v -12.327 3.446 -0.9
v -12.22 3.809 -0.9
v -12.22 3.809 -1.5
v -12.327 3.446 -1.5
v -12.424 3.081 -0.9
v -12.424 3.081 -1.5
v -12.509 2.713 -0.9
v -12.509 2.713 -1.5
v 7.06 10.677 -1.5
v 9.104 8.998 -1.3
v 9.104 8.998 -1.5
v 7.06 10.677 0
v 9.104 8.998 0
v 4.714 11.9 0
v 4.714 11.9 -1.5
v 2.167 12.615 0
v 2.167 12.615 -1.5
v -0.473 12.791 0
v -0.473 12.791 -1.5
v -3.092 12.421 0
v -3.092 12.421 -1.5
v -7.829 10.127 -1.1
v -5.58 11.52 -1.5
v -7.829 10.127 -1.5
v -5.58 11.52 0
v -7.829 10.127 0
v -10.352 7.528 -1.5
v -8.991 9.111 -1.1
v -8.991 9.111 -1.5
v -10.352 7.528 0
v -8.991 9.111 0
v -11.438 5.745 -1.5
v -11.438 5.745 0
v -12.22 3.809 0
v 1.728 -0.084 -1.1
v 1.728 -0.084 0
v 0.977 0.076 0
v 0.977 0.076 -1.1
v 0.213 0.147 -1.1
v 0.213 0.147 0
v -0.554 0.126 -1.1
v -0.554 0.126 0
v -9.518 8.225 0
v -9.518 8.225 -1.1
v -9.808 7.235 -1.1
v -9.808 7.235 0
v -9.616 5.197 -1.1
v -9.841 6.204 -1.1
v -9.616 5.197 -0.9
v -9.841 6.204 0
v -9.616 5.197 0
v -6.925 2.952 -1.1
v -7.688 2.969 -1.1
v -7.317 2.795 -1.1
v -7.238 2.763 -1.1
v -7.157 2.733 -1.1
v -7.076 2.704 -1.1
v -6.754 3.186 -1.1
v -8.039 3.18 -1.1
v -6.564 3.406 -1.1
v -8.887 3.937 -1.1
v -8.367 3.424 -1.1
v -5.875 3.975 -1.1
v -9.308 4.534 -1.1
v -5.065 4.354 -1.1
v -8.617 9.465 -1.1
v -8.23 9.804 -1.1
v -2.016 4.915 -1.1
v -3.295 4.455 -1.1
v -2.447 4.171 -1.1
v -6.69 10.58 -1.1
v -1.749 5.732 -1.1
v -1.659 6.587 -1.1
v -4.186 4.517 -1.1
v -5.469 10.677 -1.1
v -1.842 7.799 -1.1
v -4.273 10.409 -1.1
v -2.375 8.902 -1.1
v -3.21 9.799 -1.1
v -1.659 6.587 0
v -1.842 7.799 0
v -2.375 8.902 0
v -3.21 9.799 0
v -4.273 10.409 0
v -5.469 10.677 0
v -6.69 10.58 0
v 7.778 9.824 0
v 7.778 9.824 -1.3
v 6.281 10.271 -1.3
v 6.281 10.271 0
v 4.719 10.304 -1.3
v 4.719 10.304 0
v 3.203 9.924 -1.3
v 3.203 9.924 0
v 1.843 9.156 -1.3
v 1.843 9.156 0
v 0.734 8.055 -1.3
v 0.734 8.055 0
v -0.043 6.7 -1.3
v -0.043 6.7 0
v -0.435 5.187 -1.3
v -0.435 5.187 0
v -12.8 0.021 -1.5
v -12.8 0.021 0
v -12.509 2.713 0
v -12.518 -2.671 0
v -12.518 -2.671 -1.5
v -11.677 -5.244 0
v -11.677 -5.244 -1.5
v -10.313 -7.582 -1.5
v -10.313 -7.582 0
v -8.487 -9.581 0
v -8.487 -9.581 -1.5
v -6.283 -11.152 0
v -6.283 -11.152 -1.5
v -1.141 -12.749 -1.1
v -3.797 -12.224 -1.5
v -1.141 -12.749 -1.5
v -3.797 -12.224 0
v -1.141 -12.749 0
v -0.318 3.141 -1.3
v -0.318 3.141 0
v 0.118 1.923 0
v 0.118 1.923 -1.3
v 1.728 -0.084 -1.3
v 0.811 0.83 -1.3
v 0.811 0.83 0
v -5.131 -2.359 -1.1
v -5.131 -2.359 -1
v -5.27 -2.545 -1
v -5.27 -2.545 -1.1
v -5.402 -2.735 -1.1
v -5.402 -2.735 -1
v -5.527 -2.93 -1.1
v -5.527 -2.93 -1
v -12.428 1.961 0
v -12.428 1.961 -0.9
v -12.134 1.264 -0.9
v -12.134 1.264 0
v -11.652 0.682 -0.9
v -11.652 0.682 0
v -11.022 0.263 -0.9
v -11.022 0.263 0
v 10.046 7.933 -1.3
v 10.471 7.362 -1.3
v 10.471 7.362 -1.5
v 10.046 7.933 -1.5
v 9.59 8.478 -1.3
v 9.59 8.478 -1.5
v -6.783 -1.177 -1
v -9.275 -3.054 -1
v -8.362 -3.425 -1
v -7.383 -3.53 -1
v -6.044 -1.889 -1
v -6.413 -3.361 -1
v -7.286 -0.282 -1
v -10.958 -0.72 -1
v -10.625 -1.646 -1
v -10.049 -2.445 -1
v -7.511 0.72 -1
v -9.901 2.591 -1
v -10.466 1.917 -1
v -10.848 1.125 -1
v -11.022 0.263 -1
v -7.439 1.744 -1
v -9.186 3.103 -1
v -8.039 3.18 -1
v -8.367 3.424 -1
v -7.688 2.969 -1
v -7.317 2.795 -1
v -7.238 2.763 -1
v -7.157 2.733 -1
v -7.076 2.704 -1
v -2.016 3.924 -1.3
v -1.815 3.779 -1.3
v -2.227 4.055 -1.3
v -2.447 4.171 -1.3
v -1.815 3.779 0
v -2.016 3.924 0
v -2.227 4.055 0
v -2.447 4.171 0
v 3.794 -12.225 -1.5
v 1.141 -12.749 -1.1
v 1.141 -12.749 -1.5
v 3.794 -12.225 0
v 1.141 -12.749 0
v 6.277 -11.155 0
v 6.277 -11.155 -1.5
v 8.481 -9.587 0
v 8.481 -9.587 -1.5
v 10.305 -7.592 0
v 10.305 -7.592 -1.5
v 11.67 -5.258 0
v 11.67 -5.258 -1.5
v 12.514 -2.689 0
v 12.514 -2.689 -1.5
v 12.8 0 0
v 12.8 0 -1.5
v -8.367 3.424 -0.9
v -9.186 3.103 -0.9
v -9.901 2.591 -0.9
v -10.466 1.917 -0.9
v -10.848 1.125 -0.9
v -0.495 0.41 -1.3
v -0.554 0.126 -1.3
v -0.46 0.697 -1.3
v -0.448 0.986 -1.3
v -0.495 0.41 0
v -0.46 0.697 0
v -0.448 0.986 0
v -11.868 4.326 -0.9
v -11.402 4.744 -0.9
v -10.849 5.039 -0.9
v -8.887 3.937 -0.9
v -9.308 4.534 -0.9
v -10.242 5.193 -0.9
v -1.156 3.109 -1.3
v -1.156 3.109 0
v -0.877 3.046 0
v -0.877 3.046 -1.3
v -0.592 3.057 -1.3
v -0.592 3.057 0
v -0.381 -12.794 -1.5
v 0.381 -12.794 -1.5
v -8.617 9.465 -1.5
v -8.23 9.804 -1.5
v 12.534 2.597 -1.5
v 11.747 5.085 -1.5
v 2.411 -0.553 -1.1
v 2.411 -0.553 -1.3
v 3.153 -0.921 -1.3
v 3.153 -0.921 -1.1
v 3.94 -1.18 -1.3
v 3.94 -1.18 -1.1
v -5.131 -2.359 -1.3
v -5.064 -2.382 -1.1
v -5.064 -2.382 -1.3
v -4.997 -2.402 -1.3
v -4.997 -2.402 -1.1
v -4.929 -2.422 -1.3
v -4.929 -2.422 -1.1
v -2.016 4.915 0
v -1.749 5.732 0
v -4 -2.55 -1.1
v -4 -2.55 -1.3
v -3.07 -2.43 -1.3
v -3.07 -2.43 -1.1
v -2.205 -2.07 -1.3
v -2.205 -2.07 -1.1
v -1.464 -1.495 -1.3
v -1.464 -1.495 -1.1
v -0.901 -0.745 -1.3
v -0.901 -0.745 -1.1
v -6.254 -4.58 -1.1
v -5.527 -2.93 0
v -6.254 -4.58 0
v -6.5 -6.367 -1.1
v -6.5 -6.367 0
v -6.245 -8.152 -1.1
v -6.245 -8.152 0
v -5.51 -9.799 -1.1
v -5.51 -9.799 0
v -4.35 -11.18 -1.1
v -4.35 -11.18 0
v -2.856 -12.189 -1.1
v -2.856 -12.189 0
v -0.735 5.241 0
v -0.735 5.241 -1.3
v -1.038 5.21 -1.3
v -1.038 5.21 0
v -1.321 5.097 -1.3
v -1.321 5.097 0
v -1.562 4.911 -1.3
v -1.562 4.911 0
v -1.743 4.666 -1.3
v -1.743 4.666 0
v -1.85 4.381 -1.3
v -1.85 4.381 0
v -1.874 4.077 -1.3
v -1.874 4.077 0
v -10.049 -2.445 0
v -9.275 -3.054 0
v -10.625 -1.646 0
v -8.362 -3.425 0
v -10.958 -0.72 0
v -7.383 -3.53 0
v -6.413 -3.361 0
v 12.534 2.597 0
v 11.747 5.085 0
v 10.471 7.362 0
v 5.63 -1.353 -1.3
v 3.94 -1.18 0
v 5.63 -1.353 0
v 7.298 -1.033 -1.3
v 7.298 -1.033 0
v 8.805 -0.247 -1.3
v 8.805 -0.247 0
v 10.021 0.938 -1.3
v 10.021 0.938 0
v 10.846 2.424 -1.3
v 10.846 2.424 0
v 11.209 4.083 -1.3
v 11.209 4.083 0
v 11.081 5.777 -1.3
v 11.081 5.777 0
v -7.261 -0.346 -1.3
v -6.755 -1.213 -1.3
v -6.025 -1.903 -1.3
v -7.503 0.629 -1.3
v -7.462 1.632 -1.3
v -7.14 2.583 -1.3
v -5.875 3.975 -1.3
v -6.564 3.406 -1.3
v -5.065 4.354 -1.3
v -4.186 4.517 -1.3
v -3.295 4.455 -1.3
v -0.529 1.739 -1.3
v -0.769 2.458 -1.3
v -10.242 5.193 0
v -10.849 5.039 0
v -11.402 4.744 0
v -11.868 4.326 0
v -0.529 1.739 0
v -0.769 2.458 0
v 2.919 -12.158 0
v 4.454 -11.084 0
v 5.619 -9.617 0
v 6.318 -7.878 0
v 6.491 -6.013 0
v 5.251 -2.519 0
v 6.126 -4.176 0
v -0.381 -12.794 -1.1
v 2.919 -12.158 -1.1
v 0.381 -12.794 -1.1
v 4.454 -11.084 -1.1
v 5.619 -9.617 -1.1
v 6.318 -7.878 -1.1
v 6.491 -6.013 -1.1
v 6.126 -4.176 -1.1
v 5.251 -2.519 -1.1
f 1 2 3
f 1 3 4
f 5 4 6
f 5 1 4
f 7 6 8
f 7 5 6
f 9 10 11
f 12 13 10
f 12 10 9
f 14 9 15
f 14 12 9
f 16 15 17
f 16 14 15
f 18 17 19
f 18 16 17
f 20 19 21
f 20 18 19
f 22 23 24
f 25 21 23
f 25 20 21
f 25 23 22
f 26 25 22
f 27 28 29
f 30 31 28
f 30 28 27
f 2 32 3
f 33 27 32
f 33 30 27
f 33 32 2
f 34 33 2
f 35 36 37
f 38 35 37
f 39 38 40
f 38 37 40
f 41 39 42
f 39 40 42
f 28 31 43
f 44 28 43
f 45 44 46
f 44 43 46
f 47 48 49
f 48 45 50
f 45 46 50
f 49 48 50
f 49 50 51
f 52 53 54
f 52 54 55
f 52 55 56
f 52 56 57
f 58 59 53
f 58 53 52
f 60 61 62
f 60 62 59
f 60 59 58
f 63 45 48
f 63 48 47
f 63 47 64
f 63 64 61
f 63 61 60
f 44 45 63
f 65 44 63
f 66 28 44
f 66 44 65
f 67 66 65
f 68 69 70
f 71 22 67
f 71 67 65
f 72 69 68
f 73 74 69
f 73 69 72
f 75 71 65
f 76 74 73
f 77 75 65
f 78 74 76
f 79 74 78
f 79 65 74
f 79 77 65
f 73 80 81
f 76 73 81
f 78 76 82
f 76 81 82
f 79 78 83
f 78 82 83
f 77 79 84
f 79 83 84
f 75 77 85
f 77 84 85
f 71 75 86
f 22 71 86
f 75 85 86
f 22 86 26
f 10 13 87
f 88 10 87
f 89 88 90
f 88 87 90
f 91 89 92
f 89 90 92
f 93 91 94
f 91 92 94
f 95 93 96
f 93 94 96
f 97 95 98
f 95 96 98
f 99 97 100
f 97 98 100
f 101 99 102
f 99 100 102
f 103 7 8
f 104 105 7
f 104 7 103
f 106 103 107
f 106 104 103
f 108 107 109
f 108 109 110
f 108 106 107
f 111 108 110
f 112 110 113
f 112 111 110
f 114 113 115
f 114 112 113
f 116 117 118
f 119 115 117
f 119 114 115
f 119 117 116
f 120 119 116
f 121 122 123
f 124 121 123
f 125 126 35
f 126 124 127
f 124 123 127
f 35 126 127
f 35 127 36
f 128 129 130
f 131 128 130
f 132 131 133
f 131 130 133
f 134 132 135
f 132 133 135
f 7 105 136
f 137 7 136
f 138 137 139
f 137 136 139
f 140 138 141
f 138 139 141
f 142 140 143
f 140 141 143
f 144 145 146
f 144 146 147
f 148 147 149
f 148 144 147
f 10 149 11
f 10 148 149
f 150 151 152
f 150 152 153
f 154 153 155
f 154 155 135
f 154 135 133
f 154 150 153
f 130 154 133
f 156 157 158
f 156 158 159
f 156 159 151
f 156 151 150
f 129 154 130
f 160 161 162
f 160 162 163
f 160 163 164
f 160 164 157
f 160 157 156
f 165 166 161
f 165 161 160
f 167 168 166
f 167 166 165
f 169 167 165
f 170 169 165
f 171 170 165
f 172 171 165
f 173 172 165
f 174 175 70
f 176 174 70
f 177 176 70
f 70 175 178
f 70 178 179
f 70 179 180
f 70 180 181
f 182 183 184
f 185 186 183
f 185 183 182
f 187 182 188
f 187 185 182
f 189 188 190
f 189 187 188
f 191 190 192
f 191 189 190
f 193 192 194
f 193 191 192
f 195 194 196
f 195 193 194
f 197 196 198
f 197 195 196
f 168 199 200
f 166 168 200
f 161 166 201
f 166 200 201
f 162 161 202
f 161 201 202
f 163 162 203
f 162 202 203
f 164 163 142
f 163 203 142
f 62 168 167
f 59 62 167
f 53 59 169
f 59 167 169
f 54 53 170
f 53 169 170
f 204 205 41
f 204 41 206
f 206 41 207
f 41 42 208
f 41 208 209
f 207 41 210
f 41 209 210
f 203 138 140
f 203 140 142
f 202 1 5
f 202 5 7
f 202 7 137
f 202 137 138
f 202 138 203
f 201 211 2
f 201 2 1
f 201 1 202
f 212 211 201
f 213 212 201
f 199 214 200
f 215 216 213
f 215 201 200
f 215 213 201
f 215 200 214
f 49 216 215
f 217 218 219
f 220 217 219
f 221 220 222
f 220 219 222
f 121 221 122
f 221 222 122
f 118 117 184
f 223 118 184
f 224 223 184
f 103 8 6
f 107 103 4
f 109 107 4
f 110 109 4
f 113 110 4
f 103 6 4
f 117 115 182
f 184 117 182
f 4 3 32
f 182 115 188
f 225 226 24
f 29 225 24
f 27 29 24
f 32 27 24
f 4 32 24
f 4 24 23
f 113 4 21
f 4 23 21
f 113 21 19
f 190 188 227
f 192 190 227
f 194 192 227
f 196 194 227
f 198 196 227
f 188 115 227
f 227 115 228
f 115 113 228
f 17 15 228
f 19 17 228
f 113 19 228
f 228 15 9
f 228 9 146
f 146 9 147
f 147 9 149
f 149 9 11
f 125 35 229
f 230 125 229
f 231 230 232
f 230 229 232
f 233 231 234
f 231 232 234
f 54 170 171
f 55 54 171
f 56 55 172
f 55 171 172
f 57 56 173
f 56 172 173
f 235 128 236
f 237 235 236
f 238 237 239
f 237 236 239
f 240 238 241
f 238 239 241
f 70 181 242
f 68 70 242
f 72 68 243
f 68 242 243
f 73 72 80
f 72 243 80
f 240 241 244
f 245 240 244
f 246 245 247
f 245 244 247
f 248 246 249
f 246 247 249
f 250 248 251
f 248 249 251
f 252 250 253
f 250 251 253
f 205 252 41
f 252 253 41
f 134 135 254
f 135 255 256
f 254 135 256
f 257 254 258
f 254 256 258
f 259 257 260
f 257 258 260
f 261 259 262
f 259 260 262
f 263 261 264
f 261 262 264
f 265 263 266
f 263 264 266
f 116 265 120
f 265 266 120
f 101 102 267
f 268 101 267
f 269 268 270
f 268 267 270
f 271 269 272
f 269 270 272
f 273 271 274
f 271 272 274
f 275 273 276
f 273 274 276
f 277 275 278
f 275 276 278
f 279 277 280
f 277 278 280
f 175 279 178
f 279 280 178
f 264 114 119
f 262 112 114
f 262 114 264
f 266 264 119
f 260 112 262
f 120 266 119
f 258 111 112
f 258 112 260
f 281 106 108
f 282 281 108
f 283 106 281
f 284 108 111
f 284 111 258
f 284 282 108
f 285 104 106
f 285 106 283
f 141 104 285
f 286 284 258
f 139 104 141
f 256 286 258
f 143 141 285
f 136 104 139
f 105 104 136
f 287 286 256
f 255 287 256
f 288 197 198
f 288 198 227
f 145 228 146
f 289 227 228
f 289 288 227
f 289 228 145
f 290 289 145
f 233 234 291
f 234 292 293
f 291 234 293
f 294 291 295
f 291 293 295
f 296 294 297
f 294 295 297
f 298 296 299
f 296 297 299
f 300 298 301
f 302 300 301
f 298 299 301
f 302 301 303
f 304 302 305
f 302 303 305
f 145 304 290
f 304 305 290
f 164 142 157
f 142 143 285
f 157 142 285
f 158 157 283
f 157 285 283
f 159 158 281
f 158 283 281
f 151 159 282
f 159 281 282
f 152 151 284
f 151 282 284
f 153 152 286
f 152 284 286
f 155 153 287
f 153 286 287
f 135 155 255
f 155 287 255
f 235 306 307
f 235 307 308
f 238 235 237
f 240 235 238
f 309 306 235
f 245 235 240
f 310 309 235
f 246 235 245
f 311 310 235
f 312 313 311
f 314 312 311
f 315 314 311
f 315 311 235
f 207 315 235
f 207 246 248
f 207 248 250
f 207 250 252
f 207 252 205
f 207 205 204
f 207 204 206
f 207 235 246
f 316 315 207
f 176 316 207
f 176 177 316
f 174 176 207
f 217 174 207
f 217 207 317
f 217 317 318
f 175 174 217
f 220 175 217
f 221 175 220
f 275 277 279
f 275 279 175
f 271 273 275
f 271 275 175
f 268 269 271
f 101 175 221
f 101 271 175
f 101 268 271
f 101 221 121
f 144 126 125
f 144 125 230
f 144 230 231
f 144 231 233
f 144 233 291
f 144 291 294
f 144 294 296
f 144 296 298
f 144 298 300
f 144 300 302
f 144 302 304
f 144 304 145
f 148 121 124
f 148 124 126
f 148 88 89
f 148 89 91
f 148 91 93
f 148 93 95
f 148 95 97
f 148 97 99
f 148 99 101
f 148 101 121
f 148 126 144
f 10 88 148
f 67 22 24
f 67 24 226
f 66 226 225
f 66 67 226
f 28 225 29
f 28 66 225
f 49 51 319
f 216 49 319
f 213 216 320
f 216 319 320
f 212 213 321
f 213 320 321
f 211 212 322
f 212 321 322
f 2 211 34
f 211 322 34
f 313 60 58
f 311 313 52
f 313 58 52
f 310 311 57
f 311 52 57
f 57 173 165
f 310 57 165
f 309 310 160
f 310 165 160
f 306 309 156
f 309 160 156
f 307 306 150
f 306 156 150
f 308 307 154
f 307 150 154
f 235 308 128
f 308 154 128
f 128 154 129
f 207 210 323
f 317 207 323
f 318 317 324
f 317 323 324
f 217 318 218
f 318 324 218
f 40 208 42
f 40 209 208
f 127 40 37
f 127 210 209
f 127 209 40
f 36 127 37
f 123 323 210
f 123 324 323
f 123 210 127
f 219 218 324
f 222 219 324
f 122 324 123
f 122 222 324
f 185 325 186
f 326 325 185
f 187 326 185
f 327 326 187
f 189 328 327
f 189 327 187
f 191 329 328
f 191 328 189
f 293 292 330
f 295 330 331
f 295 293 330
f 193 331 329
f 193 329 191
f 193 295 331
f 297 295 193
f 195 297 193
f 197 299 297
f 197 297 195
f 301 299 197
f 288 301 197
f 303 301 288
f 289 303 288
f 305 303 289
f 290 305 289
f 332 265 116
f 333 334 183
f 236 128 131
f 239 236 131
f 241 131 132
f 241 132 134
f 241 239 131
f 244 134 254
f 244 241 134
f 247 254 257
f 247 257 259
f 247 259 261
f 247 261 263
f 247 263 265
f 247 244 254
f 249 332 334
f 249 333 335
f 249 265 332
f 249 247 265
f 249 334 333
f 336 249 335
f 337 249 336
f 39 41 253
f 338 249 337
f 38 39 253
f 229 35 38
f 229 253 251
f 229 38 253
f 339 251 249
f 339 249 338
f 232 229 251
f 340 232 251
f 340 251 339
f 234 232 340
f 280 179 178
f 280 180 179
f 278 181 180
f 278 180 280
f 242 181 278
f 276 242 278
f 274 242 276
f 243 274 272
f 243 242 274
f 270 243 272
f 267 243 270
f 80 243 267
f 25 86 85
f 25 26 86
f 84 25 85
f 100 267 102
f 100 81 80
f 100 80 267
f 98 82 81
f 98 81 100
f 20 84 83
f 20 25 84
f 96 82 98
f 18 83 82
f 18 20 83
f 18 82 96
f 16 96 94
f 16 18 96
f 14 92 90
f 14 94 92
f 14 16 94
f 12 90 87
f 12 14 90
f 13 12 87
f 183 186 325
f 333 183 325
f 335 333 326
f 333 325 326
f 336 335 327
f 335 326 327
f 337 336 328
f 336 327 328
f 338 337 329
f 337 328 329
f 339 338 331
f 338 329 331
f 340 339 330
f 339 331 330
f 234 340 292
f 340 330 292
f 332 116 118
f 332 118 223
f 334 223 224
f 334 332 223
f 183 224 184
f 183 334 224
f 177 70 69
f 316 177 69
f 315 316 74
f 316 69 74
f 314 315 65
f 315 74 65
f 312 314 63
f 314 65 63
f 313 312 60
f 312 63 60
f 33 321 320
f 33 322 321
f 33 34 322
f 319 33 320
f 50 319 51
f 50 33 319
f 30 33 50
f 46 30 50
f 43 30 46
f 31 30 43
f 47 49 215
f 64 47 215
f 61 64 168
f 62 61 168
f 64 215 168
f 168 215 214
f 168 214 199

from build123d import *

# Parameters (mm, degrees)
F1_DEPTH = 1.5
F2_DEPTH = 1.1
F3_DEPTH = 1.3
F4_DEPTH = 1
F5_DEPTH = 0.9
F6_DEPTH = 1.3
F7_DEPTH = 1.3
F8_DEPTH = 1.1


with BuildPart() as f1:
    # F0 (on Top) → F1 (new body)
    with BuildSketch(Plane.XY):
        with BuildLine():
            ThreePointArc((1.1413139167, -12.749015748), (9.4458673009, -8.6380316585), (12.8, 0))
            ThreePointArc((12.8, 0), (12.2037895541, 3.8610258375), (10.470699919, 7.3623666851))
            ThreePointArc((10.470699919, 7.3623666851), (10.0212563072, 0.9384212672), (3.9401496855, -1.1803558676))
            ThreePointArc((3.9401496855, -1.1803558676), (6.3177362198, -7.8784662435), (1.1413139167, -12.749015748))
        make_face()
        with BuildLine():
            ThreePointArc((3.9401496855, -1.1803558676), (10.0212563072, 0.9384212672), (10.470699919, 7.3623666851))
            ThreePointArc((10.470699919, 7.3623666851), (9.8213681495, 8.2085764705), (9.1038369322, 8.9977860117))
            ThreePointArc((9.1038369322, 8.9977860117), (3.2034297018, 9.9238080984), (-0.4347578085, 5.1871516796))
            ThreePointArc((-0.4347578085, 5.1871516796), (0.1140807918, 4.7873856476), (0.3236429235, 4.1415370565))
            ThreePointArc((0.3236429235, 4.1415370565), (0.1493131035, 3.5472856637), (-0.3184201999, 3.1413901588))
            ThreePointArc((-0.3184201999, 3.1413901588), (0.4342128527, 1.3569660974), (1.7281912806, -0.0839522107))
            ThreePointArc((1.7281912806, -0.0839522107), (2.8867018502, -0.5261737296), (3.9401496855, -1.1803558676))
        make_face()
        with BuildLine():
            ThreePointArc((-1.1413139167, -12.749015748), (0, -12.8), (1.1413139167, -12.749015748))
            ThreePointArc((1.1413139167, -12.749015748), (6.3177362198, -7.8784662435), (3.9401496855, -1.1803558676))
            ThreePointArc((3.9401496855, -1.1803558676), (2.7756748559, -0.7501670477), (1.7281912806, -0.0839522107))
            ThreePointArc((1.7281912806, -0.0839522107), (0.596280043, 0.1225922249), (-0.554315346, 0.1263210619))
            ThreePointArc((-0.554315346, 0.1263210619), (-2.2047100942, -2.0697503993), (-4.9291383896, -2.4219196064))
            ThreePointArc((-4.9291383896, -2.4219196064), (-5.2141366822, -2.6925550862), (-5.5274388721, -2.9298509512))
            ThreePointArc((-5.5274388721, -2.9298509512), (-5.9348180483, -9.0010252232), (-1.1413139167, -12.749015748))
        make_face()
        with BuildLine():
            ThreePointArc((-0.4347578085, 5.1871516796), (3.2034297018, 9.9238080984), (9.1038369322, 8.9977860117))
            ThreePointArc((9.1038369322, 8.9977860117), (0.8515670805, 12.7716417702), (-7.8286793929, 10.1267852235))
            ThreePointArc((-7.8286793929, 10.1267852235), (-3.7190007865, 10.1436555147), (-1.6592760481, 6.5873545071))
            ThreePointArc((-1.6592760481, 6.5873545071), (-1.8611994375, 5.316528501), (-2.4470803104, 4.1708778581))
            ThreePointArc((-2.4470803104, 4.1708778581), (-2.1205912314, 3.9914565549), (-1.8147879972, 3.7786855401))
            ThreePointArc((-1.8147879972, 3.7786855401), (-1.5620655496, 4.9113826225), (-0.4347578085, 5.1871516796))
        make_face()
        with BuildLine():
            ThreePointArc((1.7281912806, -0.0839522107), (2.7756748559, -0.7501670477), (3.9401496855, -1.1803558676))
            ThreePointArc((3.9401496855, -1.1803558676), (2.8867018502, -0.5261737296), (1.7281912806, -0.0839522107))
        make_face()
        with BuildLine():
            ThreePointArc((-12.5092777133, 2.7125580349), (-10.3126004927, -7.5822339107), (-1.1413139167, -12.749015748))
            ThreePointArc((-1.1413139167, -12.749015748), (-5.9348180483, -9.0010252232), (-5.5274388721, -2.9298509512))
            ThreePointArc((-5.5274388721, -2.9298509512), (-9.2745377761, -3.053856526), (-11.0221912783, 0.2630448617))
            ThreePointArc((-11.0221912783, 0.2630448617), (-12.1336526301, 1.2644403034), (-12.5092777133, 2.7125580349))
        make_face()
        with BuildLine():
            ThreePointArc((-1.6592760481, 6.5873545071), (-3.7190007865, 10.1436555147), (-7.8286793929, 10.1267852235))
            ThreePointArc((-7.8286793929, 10.1267852235), (-8.4249981047, 9.6363585932), (-8.9906633635, 9.1108711046))
            ThreePointArc((-8.9906633635, 9.1108711046), (-9.8078763851, 7.234529376), (-9.6163122558, 5.1969330987))
            ThreePointArc((-9.6163122558, 5.1969330987), (-8.3134717361, 4.6648999744), (-7.4786994453, 3.5319357704))
            ThreePointArc((-7.4786994453, 3.5319357704), (-7.0171820767, 3.4988442167), (-6.5639507121, 3.4057063483))
            ThreePointArc((-6.5639507121, 3.4057063483), (-4.6309358982, 4.4630943822), (-2.4470803104, 4.1708778581))
            ThreePointArc((-2.4470803104, 4.1708778581), (-1.8611994375, 5.316528501), (-1.6592760481, 6.5873545071))
        make_face()
        with BuildLine():
            ThreePointArc((0.3236429235, 4.1415370565), (0.1140807918, 4.7873856476), (-0.4347578085, 5.1871516796))
            ThreePointArc((-0.4347578085, 5.1871516796), (-0.4668571228, 4.1591375853), (-0.3184201999, 3.1413901588))
            ThreePointArc((-0.3184201999, 3.1413901588), (0.1493131035, 3.5472856637), (0.3236429235, 4.1415370565))
        make_face()
        with BuildLine():
            ThreePointArc((-0.3184201999, 3.1413901588), (-0.4668571228, 4.1591375853), (-0.4347578085, 5.1871516796))
            ThreePointArc((-0.4347578085, 5.1871516796), (-1.5620655496, 4.9113826225), (-1.8147879972, 3.7786855401))
            ThreePointArc((-1.8147879972, 3.7786855401), (-1.4632990979, 3.4659314694), (-1.1564367138, 3.1092873438))
            ThreePointArc((-1.1564367138, 3.1092873438), (-0.7342490593, 3.0423432998), (-0.3184201999, 3.1413901588))
        make_face()
        with BuildLine():
            ThreePointArc((-0.554315346, 0.1263210619), (0.596280043, 0.1225922249), (1.7281912806, -0.0839522107))
            ThreePointArc((1.7281912806, -0.0839522107), (0.4342128527, 1.3569660974), (-0.3184201999, 3.1413901588))
            ThreePointArc((-0.3184201999, 3.1413901588), (-0.7342490593, 3.0423432998), (-1.1564367138, 3.1092873438))
            ThreePointArc((-1.1564367138, 3.1092873438), (-0.6299288982, 2.1052191407), (-0.4482007155, 0.9861399191))
            ThreePointArc((-0.4482007155, 0.9861399191), (-0.4748296274, 0.5529688265), (-0.554315346, 0.1263210619))
        make_face()
        with BuildLine():
            ThreePointArc((-12.2201512567, 3.8089241608), (-12.3768602224, 3.2639440918), (-12.5092777133, 2.7125580349))
            ThreePointArc((-12.5092777133, 2.7125580349), (-12.1336526301, 1.2644403034), (-11.0221912783, 0.2630448617))
            ThreePointArc((-11.0221912783, 0.2630448617), (-10.204575831, 2.2716279569), (-8.3673749649, 3.4238406316))
            ThreePointArc((-8.3673749649, 3.4238406316), (-9.1112094109, 4.2263075504), (-9.6163122558, 5.1969330987))
            ThreePointArc((-9.6163122558, 5.1969330987), (-11.1342032079, 4.90808084), (-12.2201512567, 3.8089241608))
        make_face()
        with BuildLine():
            ThreePointArc((-11.0221912783, 0.2630448617), (-9.2745377761, -3.053856526), (-5.5274388721, -2.9298509512))
            ThreePointArc((-5.5274388721, -2.9298509512), (-5.3367748168, -2.6393619746), (-5.1308600113, -2.3594767831))
            ThreePointArc((-5.1308600113, -2.3594767831), (-7.2860930404, -0.2817879048), (-7.075700244, 2.704439708))
            ThreePointArc((-7.075700244, 2.704439708), (-7.1973059974, 2.7478141876), (-7.3174857567, 2.7949960715))
            ThreePointArc((-7.3174857567, 2.7949960715), (-8.4441033358, 0.4671377871), (-11.0221912783, 0.2630448617))
        make_face()
        with BuildLine():
            ThreePointArc((-5.1308600113, -2.3594767831), (-5.3367748168, -2.6393619746), (-5.5274388721, -2.9298509512))
            ThreePointArc((-5.5274388721, -2.9298509512), (-5.2141366822, -2.6925550862), (-4.9291383896, -2.4219196064))
            ThreePointArc((-4.9291383896, -2.4219196064), (-5.0304653636, -2.3922041354), (-5.1308600113, -2.3594767831))
        make_face()
        with BuildLine():
            ThreePointArc((-9.6163122558, 5.1969330987), (-9.8078763851, 7.234529376), (-8.9906633635, 9.1108711046))
            ThreePointArc((-8.9906633635, 9.1108711046), (-10.931711877, 6.6586541762), (-12.2201512567, 3.8089241608))
            ThreePointArc((-12.2201512567, 3.8089241608), (-11.1342032079, 4.90808084), (-9.6163122558, 5.1969330987))
        make_face()
        with BuildLine():
            ThreePointArc((-1.1564367138, 3.1092873438), (-1.5606188549, 3.3702177563), (-1.8147879972, 3.7786855401))
            ThreePointArc((-1.8147879972, 3.7786855401), (-2.1205912314, 3.9914565549), (-2.4470803104, 4.1708778581))
            ThreePointArc((-2.4470803104, 4.1708778581), (-3.5931195136, 3.1062963536), (-5.0544484876, 2.5483920029))
            ThreePointArc((-5.0544484876, 2.5483920029), (-4.2509453728, 1.3851599291), (-3.968, 0))
            ThreePointArc((-3.968, 0), (-4.048144568, -0.7481430857), (-4.2849411533, -1.4623339606))
            ThreePointArc((-4.2849411533, -1.4623339606), (-2.5466756884, -0.3696619712), (-0.554315346, 0.1263210619))
            ThreePointArc((-0.554315346, 0.1263210619), (-0.4748296274, 0.5529688265), (-0.4482007155, 0.9861399191))
            ThreePointArc((-0.4482007155, 0.9861399191), (-0.6299288982, 2.1052191407), (-1.1564367138, 3.1092873438))
        make_face()
        with BuildLine():
            ThreePointArc((-1.1564367138, 3.1092873438), (-1.4632990979, 3.4659314694), (-1.8147879972, 3.7786855401))
            ThreePointArc((-1.8147879972, 3.7786855401), (-1.5606188549, 3.3702177563), (-1.1564367138, 3.1092873438))
        make_face()
        with BuildLine():
            ThreePointArc((-4.9291383896, -2.4219196064), (-2.2047100942, -2.0697503993), (-0.554315346, 0.1263210619))
            ThreePointArc((-0.554315346, 0.1263210619), (-2.5466756884, -0.3696619712), (-4.2849411533, -1.4623339606))
            ThreePointArc((-4.2849411533, -1.4623339606), (-4.5675232248, -1.9686553693), (-4.9291383896, -2.4219196064))
        make_face()
        with BuildLine():
            ThreePointArc((-8.3673749649, 3.4238406316), (-10.204575831, 2.2716279569), (-11.0221912783, 0.2630448617))
            ThreePointArc((-11.0221912783, 0.2630448617), (-8.4441033358, 0.4671377871), (-7.3174857567, 2.7949960715))
            ThreePointArc((-7.3174857567, 2.7949960715), (-7.8660255018, 3.0700250173), (-8.3673749649, 3.4238406316))
        make_face()
        with BuildLine():
            ThreePointArc((-7.075700244, 2.704439708), (-7.2860930404, -0.2817879048), (-5.1308600113, -2.3594767831))
            ThreePointArc((-5.1308600113, -2.3594767831), (-4.7292223678, -1.8908009917), (-4.2849411533, -1.4623339606))
            ThreePointArc((-4.2849411533, -1.4623339606), (-4.048144568, -0.7481430857), (-3.968, 0))
            ThreePointArc((-3.968, 0), (-4.2509453728, 1.3851599291), (-5.0544484876, 2.5483920029))
            ThreePointArc((-5.0544484876, 2.5483920029), (-6.0748712519, 2.4995189346), (-7.075700244, 2.704439708))
        make_face()
        with BuildLine():
            ThreePointArc((-4.2849411533, -1.4623339606), (-4.7292223678, -1.8908009917), (-5.1308600113, -2.3594767831))
            ThreePointArc((-5.1308600113, -2.3594767831), (-5.0304653636, -2.3922041354), (-4.9291383896, -2.4219196064))
            ThreePointArc((-4.9291383896, -2.4219196064), (-4.5675232248, -1.9686553693), (-4.2849411533, -1.4623339606))
        make_face()
        with BuildLine():
            ThreePointArc((-7.4786994453, 3.5319357704), (-8.3134717361, 4.6648999744), (-9.6163122558, 5.1969330987))
            ThreePointArc((-9.6163122558, 5.1969330987), (-9.1112094109, 4.2263075504), (-8.3673749649, 3.4238406316))
            ThreePointArc((-8.3673749649, 3.4238406316), (-7.9264758102, 3.5061577807), (-7.4786994453, 3.5319357704))
        make_face()
        with BuildLine():
            ThreePointArc((-5.0544484876, 2.5483920029), (-3.5931195136, 3.1062963536), (-2.4470803104, 4.1708778581))
            ThreePointArc((-2.4470803104, 4.1708778581), (-4.6309358982, 4.4630943822), (-6.5639507121, 3.4057063483))
            ThreePointArc((-6.5639507121, 3.4057063483), (-5.7557084634, 3.0712328201), (-5.0544484876, 2.5483920029))
        make_face()
        with BuildLine():
            ThreePointArc((-7.4786994453, 3.5319357704), (-7.9264758102, 3.5061577807), (-8.3673749649, 3.4238406316))
            ThreePointArc((-8.3673749649, 3.4238406316), (-7.8660255018, 3.0700250173), (-7.3174857567, 2.7949960715))
            ThreePointArc((-7.3174857567, 2.7949960715), (-7.3712234042, 3.1693438542), (-7.4786994453, 3.5319357704))
        make_face()
        with BuildLine():
            ThreePointArc((-7.4786994453, 3.5319357704), (-7.3712234042, 3.1693438542), (-7.3174857567, 2.7949960715))
            ThreePointArc((-7.3174857567, 2.7949960715), (-7.1973059974, 2.7478141876), (-7.075700244, 2.704439708))
            ThreePointArc((-7.075700244, 2.704439708), (-6.8414254387, 3.0708356057), (-6.5639507121, 3.4057063483))
            ThreePointArc((-6.5639507121, 3.4057063483), (-7.0171820767, 3.4988442167), (-7.4786994453, 3.5319357704))
        make_face()
        with BuildLine():
            ThreePointArc((-6.5639507121, 3.4057063483), (-6.8414254387, 3.0708356057), (-7.075700244, 2.704439708))
            ThreePointArc((-7.075700244, 2.704439708), (-6.0748712519, 2.4995189346), (-5.0544484876, 2.5483920029))
            ThreePointArc((-5.0544484876, 2.5483920029), (-5.7557084634, 3.0712328201), (-6.5639507121, 3.4057063483))
        make_face()
    extrude(amount=-F1_DEPTH)

    # F0 (on Top) → F2 (cut)
    with BuildSketch(Plane.XY):
        with BuildLine():
            ThreePointArc((-1.1413139167, -12.749015748), (0, -12.85), (1.1413139167, -12.749015748))
            ThreePointArc((1.1413139167, -12.749015748), (0, -12.8), (-1.1413139167, -12.749015748))
        make_face()
        with BuildLine():
            ThreePointArc((-1.1413139167, -12.749015748), (0, -12.8), (1.1413139167, -12.749015748))
            ThreePointArc((1.1413139167, -12.749015748), (6.3177362198, -7.8784662435), (3.9401496855, -1.1803558676))
            ThreePointArc((3.9401496855, -1.1803558676), (2.7756748559, -0.7501670477), (1.7281912806, -0.0839522107))
            ThreePointArc((1.7281912806, -0.0839522107), (0.596280043, 0.1225922249), (-0.554315346, 0.1263210619))
            ThreePointArc((-0.554315346, 0.1263210619), (-2.2047100942, -2.0697503993), (-4.9291383896, -2.4219196064))
            ThreePointArc((-4.9291383896, -2.4219196064), (-5.2141366822, -2.6925550862), (-5.5274388721, -2.9298509512))
            ThreePointArc((-5.5274388721, -2.9298509512), (-5.9348180483, -9.0010252232), (-1.1413139167, -12.749015748))
        make_face()
        with BuildLine():
            ThreePointArc((1.7281912806, -0.0839522107), (2.7756748559, -0.7501670477), (3.9401496855, -1.1803558676))
            ThreePointArc((3.9401496855, -1.1803558676), (2.8867018502, -0.5261737296), (1.7281912806, -0.0839522107))
        make_face()
        with BuildLine():
            ThreePointArc((-4.9291383896, -2.4219196064), (-2.2047100942, -2.0697503993), (-0.554315346, 0.1263210619))
            ThreePointArc((-0.554315346, 0.1263210619), (-2.5466756884, -0.3696619712), (-4.2849411533, -1.4623339606))
            ThreePointArc((-4.2849411533, -1.4623339606), (-4.5675232248, -1.9686553693), (-4.9291383896, -2.4219196064))
        make_face()
        with BuildLine():
            ThreePointArc((-4.2849411533, -1.4623339606), (-4.7292223678, -1.8908009917), (-5.1308600113, -2.3594767831))
            ThreePointArc((-5.1308600113, -2.3594767831), (-5.0304653636, -2.3922041354), (-4.9291383896, -2.4219196064))
            ThreePointArc((-4.9291383896, -2.4219196064), (-4.5675232248, -1.9686553693), (-4.2849411533, -1.4623339606))
        make_face()
        with BuildLine():
            ThreePointArc((-5.1308600113, -2.3594767831), (-5.3367748168, -2.6393619746), (-5.5274388721, -2.9298509512))
            ThreePointArc((-5.5274388721, -2.9298509512), (-5.2141366822, -2.6925550862), (-4.9291383896, -2.4219196064))
            ThreePointArc((-4.9291383896, -2.4219196064), (-5.0304653636, -2.3922041354), (-5.1308600113, -2.3594767831))
        make_face()
    extrude(amount=-F2_DEPTH, mode=Mode.SUBTRACT)

    # F0 (on Top) → F3 (cut)
    with BuildSketch(Plane.XY):
        with BuildLine():
            ThreePointArc((-7.075700244, 2.704439708), (-7.2860930404, -0.2817879048), (-5.1308600113, -2.3594767831))
            ThreePointArc((-5.1308600113, -2.3594767831), (-4.7292223678, -1.8908009917), (-4.2849411533, -1.4623339606))
            ThreePointArc((-4.2849411533, -1.4623339606), (-4.048144568, -0.7481430857), (-3.968, 0))
            ThreePointArc((-3.968, 0), (-4.2509453728, 1.3851599291), (-5.0544484876, 2.5483920029))
            ThreePointArc((-5.0544484876, 2.5483920029), (-6.0748712519, 2.4995189346), (-7.075700244, 2.704439708))
        make_face()
        with BuildLine():
            ThreePointArc((-1.1564367138, 3.1092873438), (-1.5606188549, 3.3702177563), (-1.8147879972, 3.7786855401))
            ThreePointArc((-1.8147879972, 3.7786855401), (-2.1205912314, 3.9914565549), (-2.4470803104, 4.1708778581))
            ThreePointArc((-2.4470803104, 4.1708778581), (-3.5931195136, 3.1062963536), (-5.0544484876, 2.5483920029))
            ThreePointArc((-5.0544484876, 2.5483920029), (-4.2509453728, 1.3851599291), (-3.968, 0))
            ThreePointArc((-3.968, 0), (-4.048144568, -0.7481430857), (-4.2849411533, -1.4623339606))
            ThreePointArc((-4.2849411533, -1.4623339606), (-2.5466756884, -0.3696619712), (-0.554315346, 0.1263210619))
            ThreePointArc((-0.554315346, 0.1263210619), (-0.4748296274, 0.5529688265), (-0.4482007155, 0.9861399191))
            ThreePointArc((-0.4482007155, 0.9861399191), (-0.6299288982, 2.1052191407), (-1.1564367138, 3.1092873438))
        make_face()
        with BuildLine():
            ThreePointArc((-5.0544484876, 2.5483920029), (-3.5931195136, 3.1062963536), (-2.4470803104, 4.1708778581))
            ThreePointArc((-2.4470803104, 4.1708778581), (-4.6309358982, 4.4630943822), (-6.5639507121, 3.4057063483))
            ThreePointArc((-6.5639507121, 3.4057063483), (-5.7557084634, 3.0712328201), (-5.0544484876, 2.5483920029))
        make_face()
        with BuildLine():
            ThreePointArc((-6.5639507121, 3.4057063483), (-6.8414254387, 3.0708356057), (-7.075700244, 2.704439708))
            ThreePointArc((-7.075700244, 2.704439708), (-6.0748712519, 2.4995189346), (-5.0544484876, 2.5483920029))
            ThreePointArc((-5.0544484876, 2.5483920029), (-5.7557084634, 3.0712328201), (-6.5639507121, 3.4057063483))
        make_face()
        with BuildLine():
            ThreePointArc((-4.9291383896, -2.4219196064), (-2.2047100942, -2.0697503993), (-0.554315346, 0.1263210619))
            ThreePointArc((-0.554315346, 0.1263210619), (-2.5466756884, -0.3696619712), (-4.2849411533, -1.4623339606))
            ThreePointArc((-4.2849411533, -1.4623339606), (-4.5675232248, -1.9686553693), (-4.9291383896, -2.4219196064))
        make_face()
        with BuildLine():
            ThreePointArc((-4.2849411533, -1.4623339606), (-4.7292223678, -1.8908009917), (-5.1308600113, -2.3594767831))
            ThreePointArc((-5.1308600113, -2.3594767831), (-5.0304653636, -2.3922041354), (-4.9291383896, -2.4219196064))
            ThreePointArc((-4.9291383896, -2.4219196064), (-4.5675232248, -1.9686553693), (-4.2849411533, -1.4623339606))
        make_face()
        with BuildLine():
            ThreePointArc((-1.1564367138, 3.1092873438), (-1.4632990979, 3.4659314694), (-1.8147879972, 3.7786855401))
            ThreePointArc((-1.8147879972, 3.7786855401), (-1.5606188549, 3.3702177563), (-1.1564367138, 3.1092873438))
        make_face()
    extrude(amount=-F3_DEPTH, mode=Mode.SUBTRACT)

    # F0 (on Top) → F4 (cut)
    with BuildSketch(Plane.XY):
        with BuildLine():
            ThreePointArc((-11.0221912783, 0.2630448617), (-9.2745377761, -3.053856526), (-5.5274388721, -2.9298509512))
            ThreePointArc((-5.5274388721, -2.9298509512), (-5.3367748168, -2.6393619746), (-5.1308600113, -2.3594767831))
            ThreePointArc((-5.1308600113, -2.3594767831), (-7.2860930404, -0.2817879048), (-7.075700244, 2.704439708))
            ThreePointArc((-7.075700244, 2.704439708), (-7.1973059974, 2.7478141876), (-7.3174857567, 2.7949960715))
            ThreePointArc((-7.3174857567, 2.7949960715), (-8.4441033358, 0.4671377871), (-11.0221912783, 0.2630448617))
        make_face()
        with BuildLine():
            ThreePointArc((-8.3673749649, 3.4238406316), (-10.204575831, 2.2716279569), (-11.0221912783, 0.2630448617))
            ThreePointArc((-11.0221912783, 0.2630448617), (-8.4441033358, 0.4671377871), (-7.3174857567, 2.7949960715))
            ThreePointArc((-7.3174857567, 2.7949960715), (-7.8660255018, 3.0700250173), (-8.3673749649, 3.4238406316))
        make_face()
        with BuildLine():
            ThreePointArc((-7.4786994453, 3.5319357704), (-7.9264758102, 3.5061577807), (-8.3673749649, 3.4238406316))
            ThreePointArc((-8.3673749649, 3.4238406316), (-7.8660255018, 3.0700250173), (-7.3174857567, 2.7949960715))
            ThreePointArc((-7.3174857567, 2.7949960715), (-7.3712234042, 3.1693438542), (-7.4786994453, 3.5319357704))
        make_face()
        with BuildLine():
            ThreePointArc((-7.4786994453, 3.5319357704), (-7.3712234042, 3.1693438542), (-7.3174857567, 2.7949960715))
            ThreePointArc((-7.3174857567, 2.7949960715), (-7.1973059974, 2.7478141876), (-7.075700244, 2.704439708))
            ThreePointArc((-7.075700244, 2.704439708), (-6.8414254387, 3.0708356057), (-6.5639507121, 3.4057063483))
            ThreePointArc((-6.5639507121, 3.4057063483), (-7.0171820767, 3.4988442167), (-7.4786994453, 3.5319357704))
        make_face()
    extrude(amount=-F4_DEPTH, mode=Mode.SUBTRACT)

    # F0 (on Top) → F5 (cut)
    with BuildSketch(Plane.XY):
        with BuildLine():
            ThreePointArc((-12.2201512567, 3.8089241608), (-12.3768602224, 3.2639440918), (-12.5092777133, 2.7125580349))
            ThreePointArc((-12.5092777133, 2.7125580349), (-12.1336526301, 1.2644403034), (-11.0221912783, 0.2630448617))
            ThreePointArc((-11.0221912783, 0.2630448617), (-10.204575831, 2.2716279569), (-8.3673749649, 3.4238406316))
            ThreePointArc((-8.3673749649, 3.4238406316), (-9.1112094109, 4.2263075504), (-9.6163122558, 5.1969330987))
            ThreePointArc((-9.6163122558, 5.1969330987), (-11.1342032079, 4.90808084), (-12.2201512567, 3.8089241608))
        make_face()
        with BuildLine():
            ThreePointArc((-7.4786994453, 3.5319357704), (-8.3134717361, 4.6648999744), (-9.6163122558, 5.1969330987))
            ThreePointArc((-9.6163122558, 5.1969330987), (-9.1112094109, 4.2263075504), (-8.3673749649, 3.4238406316))
            ThreePointArc((-8.3673749649, 3.4238406316), (-7.9264758102, 3.5061577807), (-7.4786994453, 3.5319357704))
        make_face()
    extrude(amount=-F5_DEPTH, mode=Mode.SUBTRACT)

    # F0 (on Top) → F6 (cut)
    with BuildSketch(Plane.XY):
        with BuildLine():
            ThreePointArc((3.9401496855, -1.1803558676), (10.0212563072, 0.9384212672), (10.470699919, 7.3623666851))
            ThreePointArc((10.470699919, 7.3623666851), (9.8213681495, 8.2085764705), (9.1038369322, 8.9977860117))
            ThreePointArc((9.1038369322, 8.9977860117), (3.2034297018, 9.9238080984), (-0.4347578085, 5.1871516796))
            ThreePointArc((-0.4347578085, 5.1871516796), (0.1140807918, 4.7873856476), (0.3236429235, 4.1415370565))
            ThreePointArc((0.3236429235, 4.1415370565), (0.1493131035, 3.5472856637), (-0.3184201999, 3.1413901588))
            ThreePointArc((-0.3184201999, 3.1413901588), (0.4342128527, 1.3569660974), (1.7281912806, -0.0839522107))
            ThreePointArc((1.7281912806, -0.0839522107), (2.8867018502, -0.5261737296), (3.9401496855, -1.1803558676))
        make_face()
        with BuildLine():
            ThreePointArc((0.3236429235, 4.1415370565), (0.1140807918, 4.7873856476), (-0.4347578085, 5.1871516796))
            ThreePointArc((-0.4347578085, 5.1871516796), (-0.4668571228, 4.1591375853), (-0.3184201999, 3.1413901588))
            ThreePointArc((-0.3184201999, 3.1413901588), (0.1493131035, 3.5472856637), (0.3236429235, 4.1415370565))
        make_face()
        with BuildLine():
            ThreePointArc((1.7281912806, -0.0839522107), (2.7756748559, -0.7501670477), (3.9401496855, -1.1803558676))
            ThreePointArc((3.9401496855, -1.1803558676), (2.8867018502, -0.5261737296), (1.7281912806, -0.0839522107))
        make_face()
        with BuildLine():
            ThreePointArc((9.1038369322, 8.9977860117), (9.8213681495, 8.2085764705), (10.470699919, 7.3623666851))
            ThreePointArc((10.470699919, 7.3623666851), (9.8623786831, 8.2428525608), (9.1038369322, 8.9977860117))
        make_face()
    extrude(amount=-F6_DEPTH, mode=Mode.SUBTRACT)

    # F0 (on Top) → F7 (cut)
    with BuildSketch(Plane.XY):
        with BuildLine():
            ThreePointArc((-0.3184201999, 3.1413901588), (-0.4668571228, 4.1591375853), (-0.4347578085, 5.1871516796))
            ThreePointArc((-0.4347578085, 5.1871516796), (-1.5620655496, 4.9113826225), (-1.8147879972, 3.7786855401))
            ThreePointArc((-1.8147879972, 3.7786855401), (-1.4632990979, 3.4659314694), (-1.1564367138, 3.1092873438))
            ThreePointArc((-1.1564367138, 3.1092873438), (-0.7342490593, 3.0423432998), (-0.3184201999, 3.1413901588))
        make_face()
        with BuildLine():
            ThreePointArc((0.3236429235, 4.1415370565), (0.1140807918, 4.7873856476), (-0.4347578085, 5.1871516796))
            ThreePointArc((-0.4347578085, 5.1871516796), (-0.4668571228, 4.1591375853), (-0.3184201999, 3.1413901588))
            ThreePointArc((-0.3184201999, 3.1413901588), (0.1493131035, 3.5472856637), (0.3236429235, 4.1415370565))
        make_face()
        with BuildLine():
            ThreePointArc((-1.1564367138, 3.1092873438), (-1.4632990979, 3.4659314694), (-1.8147879972, 3.7786855401))
            ThreePointArc((-1.8147879972, 3.7786855401), (-1.5606188549, 3.3702177563), (-1.1564367138, 3.1092873438))
        make_face()
    extrude(amount=-F7_DEPTH, mode=Mode.SUBTRACT)

    # F0 (on Top) → F8 (cut)
    with BuildSketch(Plane.XY):
        with BuildLine():
            ThreePointArc((-1.6592760481, 6.5873545071), (-3.7190007865, 10.1436555147), (-7.8286793929, 10.1267852235))
            ThreePointArc((-7.8286793929, 10.1267852235), (-8.4249981047, 9.6363585932), (-8.9906633635, 9.1108711046))
            ThreePointArc((-8.9906633635, 9.1108711046), (-9.8078763851, 7.234529376), (-9.6163122558, 5.1969330987))
            ThreePointArc((-9.6163122558, 5.1969330987), (-8.3134717361, 4.6648999744), (-7.4786994453, 3.5319357704))
            ThreePointArc((-7.4786994453, 3.5319357704), (-7.0171820767, 3.4988442167), (-6.5639507121, 3.4057063483))
            ThreePointArc((-6.5639507121, 3.4057063483), (-4.6309358982, 4.4630943822), (-2.4470803104, 4.1708778581))
            ThreePointArc((-2.4470803104, 4.1708778581), (-1.8611994375, 5.316528501), (-1.6592760481, 6.5873545071))
        make_face()
        with BuildLine():
            ThreePointArc((-7.4786994453, 3.5319357704), (-8.3134717361, 4.6648999744), (-9.6163122558, 5.1969330987))
            ThreePointArc((-9.6163122558, 5.1969330987), (-9.1112094109, 4.2263075504), (-8.3673749649, 3.4238406316))
            ThreePointArc((-8.3673749649, 3.4238406316), (-7.9264758102, 3.5061577807), (-7.4786994453, 3.5319357704))
        make_face()
        with BuildLine():
            ThreePointArc((-5.0544484876, 2.5483920029), (-3.5931195136, 3.1062963536), (-2.4470803104, 4.1708778581))
            ThreePointArc((-2.4470803104, 4.1708778581), (-4.6309358982, 4.4630943822), (-6.5639507121, 3.4057063483))
            ThreePointArc((-6.5639507121, 3.4057063483), (-5.7557084634, 3.0712328201), (-5.0544484876, 2.5483920029))
        make_face()
        with BuildLine():
            ThreePointArc((-6.5639507121, 3.4057063483), (-6.8414254387, 3.0708356057), (-7.075700244, 2.704439708))
            ThreePointArc((-7.075700244, 2.704439708), (-6.0748712519, 2.4995189346), (-5.0544484876, 2.5483920029))
            ThreePointArc((-5.0544484876, 2.5483920029), (-5.7557084634, 3.0712328201), (-6.5639507121, 3.4057063483))
        make_face()
        with BuildLine():
            ThreePointArc((-7.4786994453, 3.5319357704), (-7.9264758102, 3.5061577807), (-8.3673749649, 3.4238406316))
            ThreePointArc((-8.3673749649, 3.4238406316), (-7.8660255018, 3.0700250173), (-7.3174857567, 2.7949960715))
            ThreePointArc((-7.3174857567, 2.7949960715), (-7.3712234042, 3.1693438542), (-7.4786994453, 3.5319357704))
        make_face()
        with BuildLine():
            ThreePointArc((-7.4786994453, 3.5319357704), (-7.3712234042, 3.1693438542), (-7.3174857567, 2.7949960715))
            ThreePointArc((-7.3174857567, 2.7949960715), (-7.1973059974, 2.7478141876), (-7.075700244, 2.704439708))
            ThreePointArc((-7.075700244, 2.704439708), (-6.8414254387, 3.0708356057), (-6.5639507121, 3.4057063483))
            ThreePointArc((-6.5639507121, 3.4057063483), (-7.0171820767, 3.4988442167), (-7.4786994453, 3.5319357704))
        make_face()
    extrude(amount=-F8_DEPTH, mode=Mode.SUBTRACT)


solid = f1.part
